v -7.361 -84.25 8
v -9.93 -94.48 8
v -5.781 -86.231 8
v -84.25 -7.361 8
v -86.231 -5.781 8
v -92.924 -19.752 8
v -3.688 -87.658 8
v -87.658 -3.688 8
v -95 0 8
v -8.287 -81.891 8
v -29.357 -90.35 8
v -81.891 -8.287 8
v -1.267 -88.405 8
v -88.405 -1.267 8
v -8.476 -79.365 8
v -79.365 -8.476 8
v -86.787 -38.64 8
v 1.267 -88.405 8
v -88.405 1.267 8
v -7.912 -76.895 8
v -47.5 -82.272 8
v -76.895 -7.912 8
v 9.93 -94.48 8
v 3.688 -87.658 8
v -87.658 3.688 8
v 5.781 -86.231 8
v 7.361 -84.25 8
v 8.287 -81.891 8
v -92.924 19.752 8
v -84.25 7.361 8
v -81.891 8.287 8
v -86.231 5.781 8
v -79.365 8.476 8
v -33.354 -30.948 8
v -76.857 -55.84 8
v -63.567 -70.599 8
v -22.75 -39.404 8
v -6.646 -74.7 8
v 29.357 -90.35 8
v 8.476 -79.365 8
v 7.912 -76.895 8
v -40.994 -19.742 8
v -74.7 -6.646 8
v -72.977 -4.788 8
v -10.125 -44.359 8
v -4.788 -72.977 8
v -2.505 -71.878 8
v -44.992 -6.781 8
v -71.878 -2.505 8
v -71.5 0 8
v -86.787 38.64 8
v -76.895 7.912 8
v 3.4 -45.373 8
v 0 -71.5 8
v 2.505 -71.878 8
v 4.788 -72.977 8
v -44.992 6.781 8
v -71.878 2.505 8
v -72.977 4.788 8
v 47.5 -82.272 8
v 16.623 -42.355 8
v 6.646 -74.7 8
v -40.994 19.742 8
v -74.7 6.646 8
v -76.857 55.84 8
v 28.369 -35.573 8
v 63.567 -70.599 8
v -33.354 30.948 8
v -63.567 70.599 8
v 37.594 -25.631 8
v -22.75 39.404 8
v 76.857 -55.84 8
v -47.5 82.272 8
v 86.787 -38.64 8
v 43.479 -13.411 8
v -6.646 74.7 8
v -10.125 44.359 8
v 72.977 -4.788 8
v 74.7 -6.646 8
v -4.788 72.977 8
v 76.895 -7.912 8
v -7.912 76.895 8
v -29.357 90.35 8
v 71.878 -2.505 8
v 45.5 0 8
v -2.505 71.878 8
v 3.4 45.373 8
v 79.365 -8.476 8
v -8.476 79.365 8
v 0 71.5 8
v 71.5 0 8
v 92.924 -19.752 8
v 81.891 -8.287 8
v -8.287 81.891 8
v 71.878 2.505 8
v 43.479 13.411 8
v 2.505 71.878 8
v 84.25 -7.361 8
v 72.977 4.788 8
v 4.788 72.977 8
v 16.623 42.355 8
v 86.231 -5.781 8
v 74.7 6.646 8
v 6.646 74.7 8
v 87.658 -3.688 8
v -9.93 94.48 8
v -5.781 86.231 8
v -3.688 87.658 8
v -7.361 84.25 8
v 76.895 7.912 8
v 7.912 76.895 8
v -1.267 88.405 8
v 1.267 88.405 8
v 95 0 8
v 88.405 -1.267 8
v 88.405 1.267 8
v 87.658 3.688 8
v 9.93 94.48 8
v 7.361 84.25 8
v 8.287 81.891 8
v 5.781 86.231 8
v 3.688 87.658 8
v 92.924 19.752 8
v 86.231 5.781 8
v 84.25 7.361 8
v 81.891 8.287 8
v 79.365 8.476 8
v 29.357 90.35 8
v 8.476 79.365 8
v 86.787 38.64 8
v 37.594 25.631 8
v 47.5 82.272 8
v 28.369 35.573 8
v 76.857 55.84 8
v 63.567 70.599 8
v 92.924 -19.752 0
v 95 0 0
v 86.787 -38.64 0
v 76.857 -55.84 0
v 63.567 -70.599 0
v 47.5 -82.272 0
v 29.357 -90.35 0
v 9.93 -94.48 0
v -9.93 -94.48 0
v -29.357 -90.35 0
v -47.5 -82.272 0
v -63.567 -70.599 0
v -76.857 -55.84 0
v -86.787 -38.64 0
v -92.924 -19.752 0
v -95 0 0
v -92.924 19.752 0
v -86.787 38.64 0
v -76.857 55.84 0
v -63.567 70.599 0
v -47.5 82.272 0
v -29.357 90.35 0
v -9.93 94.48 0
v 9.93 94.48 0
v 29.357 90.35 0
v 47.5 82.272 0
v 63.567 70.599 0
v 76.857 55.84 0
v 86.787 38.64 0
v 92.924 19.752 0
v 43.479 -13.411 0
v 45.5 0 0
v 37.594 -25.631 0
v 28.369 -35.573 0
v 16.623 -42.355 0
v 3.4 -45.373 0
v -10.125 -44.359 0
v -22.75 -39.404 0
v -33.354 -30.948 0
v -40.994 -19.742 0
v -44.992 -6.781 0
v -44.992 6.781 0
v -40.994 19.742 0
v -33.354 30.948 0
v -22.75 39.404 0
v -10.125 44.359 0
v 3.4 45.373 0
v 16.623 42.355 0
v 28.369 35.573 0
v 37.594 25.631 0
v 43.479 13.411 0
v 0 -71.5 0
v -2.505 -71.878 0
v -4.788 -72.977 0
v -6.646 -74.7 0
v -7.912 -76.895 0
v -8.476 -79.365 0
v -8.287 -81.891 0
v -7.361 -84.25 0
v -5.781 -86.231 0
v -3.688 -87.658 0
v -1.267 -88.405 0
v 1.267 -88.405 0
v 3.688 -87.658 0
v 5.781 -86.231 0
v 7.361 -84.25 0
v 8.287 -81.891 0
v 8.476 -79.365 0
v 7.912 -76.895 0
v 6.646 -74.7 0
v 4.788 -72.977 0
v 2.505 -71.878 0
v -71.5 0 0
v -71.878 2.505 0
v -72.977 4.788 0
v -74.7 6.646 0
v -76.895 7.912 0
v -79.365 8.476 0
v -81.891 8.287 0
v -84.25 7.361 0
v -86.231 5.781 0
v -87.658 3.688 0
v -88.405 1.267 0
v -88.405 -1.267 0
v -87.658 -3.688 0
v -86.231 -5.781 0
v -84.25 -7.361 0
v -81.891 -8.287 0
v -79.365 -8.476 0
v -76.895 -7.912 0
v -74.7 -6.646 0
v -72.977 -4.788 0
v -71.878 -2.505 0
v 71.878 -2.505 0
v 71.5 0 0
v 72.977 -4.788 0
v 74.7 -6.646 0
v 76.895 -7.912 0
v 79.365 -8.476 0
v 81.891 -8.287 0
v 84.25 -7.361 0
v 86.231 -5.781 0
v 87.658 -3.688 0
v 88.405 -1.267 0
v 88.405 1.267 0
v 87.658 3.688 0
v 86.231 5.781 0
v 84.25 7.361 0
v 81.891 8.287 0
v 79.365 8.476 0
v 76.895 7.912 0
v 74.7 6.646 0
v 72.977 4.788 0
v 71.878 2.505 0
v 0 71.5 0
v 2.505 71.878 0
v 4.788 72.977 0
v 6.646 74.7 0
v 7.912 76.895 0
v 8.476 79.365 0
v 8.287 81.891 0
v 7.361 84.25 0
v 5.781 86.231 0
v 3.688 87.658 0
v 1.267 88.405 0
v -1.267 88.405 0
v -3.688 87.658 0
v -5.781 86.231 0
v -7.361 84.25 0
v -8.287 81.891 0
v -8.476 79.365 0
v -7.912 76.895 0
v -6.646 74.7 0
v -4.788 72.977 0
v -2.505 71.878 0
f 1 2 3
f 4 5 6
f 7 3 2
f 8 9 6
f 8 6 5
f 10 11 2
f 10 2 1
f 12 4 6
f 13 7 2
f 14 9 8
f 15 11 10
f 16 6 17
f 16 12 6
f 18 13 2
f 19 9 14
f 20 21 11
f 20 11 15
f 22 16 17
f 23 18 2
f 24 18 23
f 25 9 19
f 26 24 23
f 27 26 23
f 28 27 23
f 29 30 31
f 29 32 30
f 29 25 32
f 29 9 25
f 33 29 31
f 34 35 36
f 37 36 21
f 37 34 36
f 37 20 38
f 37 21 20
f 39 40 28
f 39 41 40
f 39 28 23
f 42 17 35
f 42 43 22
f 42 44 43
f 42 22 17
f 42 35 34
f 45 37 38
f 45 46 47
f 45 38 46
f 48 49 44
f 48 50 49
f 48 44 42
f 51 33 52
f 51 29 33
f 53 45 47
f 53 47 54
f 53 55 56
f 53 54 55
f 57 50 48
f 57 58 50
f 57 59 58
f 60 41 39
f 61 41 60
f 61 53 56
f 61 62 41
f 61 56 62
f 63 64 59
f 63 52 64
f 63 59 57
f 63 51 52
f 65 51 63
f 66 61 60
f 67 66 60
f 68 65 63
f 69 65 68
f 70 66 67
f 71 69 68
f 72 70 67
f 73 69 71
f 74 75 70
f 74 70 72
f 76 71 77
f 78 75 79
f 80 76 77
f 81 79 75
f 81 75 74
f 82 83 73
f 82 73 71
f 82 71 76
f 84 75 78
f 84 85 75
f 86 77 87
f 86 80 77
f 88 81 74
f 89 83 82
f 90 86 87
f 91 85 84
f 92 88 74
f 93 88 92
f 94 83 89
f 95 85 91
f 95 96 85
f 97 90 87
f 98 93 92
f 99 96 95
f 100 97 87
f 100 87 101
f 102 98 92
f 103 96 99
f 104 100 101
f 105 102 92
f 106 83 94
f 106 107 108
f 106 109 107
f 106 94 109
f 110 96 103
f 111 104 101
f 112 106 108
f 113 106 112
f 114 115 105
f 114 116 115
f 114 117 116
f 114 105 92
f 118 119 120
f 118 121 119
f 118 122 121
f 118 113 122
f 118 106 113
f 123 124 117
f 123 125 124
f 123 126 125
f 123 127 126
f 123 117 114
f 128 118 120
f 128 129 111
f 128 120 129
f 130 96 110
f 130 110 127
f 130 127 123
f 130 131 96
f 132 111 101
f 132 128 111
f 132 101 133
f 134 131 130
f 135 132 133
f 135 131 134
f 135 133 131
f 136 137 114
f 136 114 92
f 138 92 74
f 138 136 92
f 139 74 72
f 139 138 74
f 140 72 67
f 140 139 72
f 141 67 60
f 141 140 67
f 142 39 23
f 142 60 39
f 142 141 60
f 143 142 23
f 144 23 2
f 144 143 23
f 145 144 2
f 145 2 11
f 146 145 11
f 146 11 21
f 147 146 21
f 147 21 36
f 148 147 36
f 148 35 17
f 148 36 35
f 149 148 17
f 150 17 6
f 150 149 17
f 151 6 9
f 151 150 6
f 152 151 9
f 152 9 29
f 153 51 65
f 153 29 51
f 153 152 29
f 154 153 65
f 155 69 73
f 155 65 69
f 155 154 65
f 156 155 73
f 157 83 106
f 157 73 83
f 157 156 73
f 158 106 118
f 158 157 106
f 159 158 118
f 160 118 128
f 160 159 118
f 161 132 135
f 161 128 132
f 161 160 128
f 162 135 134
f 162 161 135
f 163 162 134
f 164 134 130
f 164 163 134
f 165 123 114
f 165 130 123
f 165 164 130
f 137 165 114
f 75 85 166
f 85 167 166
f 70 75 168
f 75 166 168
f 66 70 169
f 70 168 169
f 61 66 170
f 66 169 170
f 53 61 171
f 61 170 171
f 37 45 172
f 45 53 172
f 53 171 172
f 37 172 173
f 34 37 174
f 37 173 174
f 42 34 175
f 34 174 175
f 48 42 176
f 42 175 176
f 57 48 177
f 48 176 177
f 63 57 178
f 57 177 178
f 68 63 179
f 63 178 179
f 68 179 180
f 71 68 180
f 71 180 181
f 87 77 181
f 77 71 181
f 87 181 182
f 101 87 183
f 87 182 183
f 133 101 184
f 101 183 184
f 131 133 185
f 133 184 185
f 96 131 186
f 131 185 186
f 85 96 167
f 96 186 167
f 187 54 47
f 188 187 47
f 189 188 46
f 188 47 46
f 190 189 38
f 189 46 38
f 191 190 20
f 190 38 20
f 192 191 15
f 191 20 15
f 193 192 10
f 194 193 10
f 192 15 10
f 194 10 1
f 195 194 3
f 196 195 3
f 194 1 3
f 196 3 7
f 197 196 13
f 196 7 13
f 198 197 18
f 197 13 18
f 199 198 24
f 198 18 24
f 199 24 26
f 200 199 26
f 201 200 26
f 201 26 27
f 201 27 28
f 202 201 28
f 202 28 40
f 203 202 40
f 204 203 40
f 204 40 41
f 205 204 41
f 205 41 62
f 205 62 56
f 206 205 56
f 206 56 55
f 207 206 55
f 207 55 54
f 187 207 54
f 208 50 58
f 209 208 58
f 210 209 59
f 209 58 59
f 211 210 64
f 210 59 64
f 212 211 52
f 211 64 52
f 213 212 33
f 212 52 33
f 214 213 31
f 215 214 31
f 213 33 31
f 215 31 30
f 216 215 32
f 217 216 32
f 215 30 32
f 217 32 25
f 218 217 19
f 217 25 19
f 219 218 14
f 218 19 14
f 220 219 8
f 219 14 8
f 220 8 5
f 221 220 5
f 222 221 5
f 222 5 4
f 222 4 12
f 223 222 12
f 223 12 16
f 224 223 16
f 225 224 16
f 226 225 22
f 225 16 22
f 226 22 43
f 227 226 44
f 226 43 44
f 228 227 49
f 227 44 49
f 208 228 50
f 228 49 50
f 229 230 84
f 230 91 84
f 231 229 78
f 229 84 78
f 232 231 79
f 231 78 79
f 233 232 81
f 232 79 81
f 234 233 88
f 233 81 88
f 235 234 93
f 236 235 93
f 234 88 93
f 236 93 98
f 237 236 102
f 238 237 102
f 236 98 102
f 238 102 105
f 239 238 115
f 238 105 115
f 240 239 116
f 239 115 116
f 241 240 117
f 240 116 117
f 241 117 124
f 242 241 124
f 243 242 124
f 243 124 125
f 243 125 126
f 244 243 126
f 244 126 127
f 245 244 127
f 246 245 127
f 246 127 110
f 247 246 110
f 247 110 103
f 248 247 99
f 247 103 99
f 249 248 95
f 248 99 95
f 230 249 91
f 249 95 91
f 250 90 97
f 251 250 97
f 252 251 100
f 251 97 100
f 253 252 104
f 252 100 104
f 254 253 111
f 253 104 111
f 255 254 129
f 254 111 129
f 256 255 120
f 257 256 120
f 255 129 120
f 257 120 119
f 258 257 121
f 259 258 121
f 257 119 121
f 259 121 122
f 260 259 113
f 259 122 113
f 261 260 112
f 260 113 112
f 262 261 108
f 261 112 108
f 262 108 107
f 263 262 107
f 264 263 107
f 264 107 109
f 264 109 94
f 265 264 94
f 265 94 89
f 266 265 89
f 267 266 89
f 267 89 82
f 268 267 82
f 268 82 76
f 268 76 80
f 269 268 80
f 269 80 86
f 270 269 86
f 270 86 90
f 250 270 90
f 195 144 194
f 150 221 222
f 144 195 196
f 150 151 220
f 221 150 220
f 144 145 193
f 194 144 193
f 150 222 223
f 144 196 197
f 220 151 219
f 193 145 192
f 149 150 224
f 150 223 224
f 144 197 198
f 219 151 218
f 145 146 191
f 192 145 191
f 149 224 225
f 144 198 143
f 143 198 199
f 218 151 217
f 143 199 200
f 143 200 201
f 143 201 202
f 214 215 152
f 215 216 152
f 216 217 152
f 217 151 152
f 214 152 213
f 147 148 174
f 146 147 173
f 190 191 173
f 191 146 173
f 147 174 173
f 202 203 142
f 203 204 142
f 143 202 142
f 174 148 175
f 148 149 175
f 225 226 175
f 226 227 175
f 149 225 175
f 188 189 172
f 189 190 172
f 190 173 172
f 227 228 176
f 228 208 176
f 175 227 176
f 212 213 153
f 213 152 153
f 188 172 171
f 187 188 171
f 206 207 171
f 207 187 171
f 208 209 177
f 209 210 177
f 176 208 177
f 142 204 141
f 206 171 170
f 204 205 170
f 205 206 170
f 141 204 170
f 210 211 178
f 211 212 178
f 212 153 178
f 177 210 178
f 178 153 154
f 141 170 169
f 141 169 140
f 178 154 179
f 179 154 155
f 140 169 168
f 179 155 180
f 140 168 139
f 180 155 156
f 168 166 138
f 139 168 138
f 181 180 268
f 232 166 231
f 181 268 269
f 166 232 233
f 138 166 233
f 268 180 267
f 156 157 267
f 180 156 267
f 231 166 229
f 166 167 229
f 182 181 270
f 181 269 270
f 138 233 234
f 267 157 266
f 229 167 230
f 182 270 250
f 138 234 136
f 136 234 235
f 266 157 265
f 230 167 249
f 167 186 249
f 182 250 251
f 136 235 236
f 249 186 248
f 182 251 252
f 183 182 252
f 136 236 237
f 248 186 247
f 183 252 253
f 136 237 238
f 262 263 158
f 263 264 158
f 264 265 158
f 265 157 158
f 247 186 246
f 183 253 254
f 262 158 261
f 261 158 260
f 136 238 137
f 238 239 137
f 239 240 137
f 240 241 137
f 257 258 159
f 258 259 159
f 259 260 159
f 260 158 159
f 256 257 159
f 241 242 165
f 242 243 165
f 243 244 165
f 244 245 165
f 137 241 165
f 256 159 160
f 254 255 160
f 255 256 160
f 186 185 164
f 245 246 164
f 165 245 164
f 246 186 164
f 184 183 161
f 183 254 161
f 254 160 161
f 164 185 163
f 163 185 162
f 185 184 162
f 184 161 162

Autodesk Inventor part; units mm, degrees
ref_plane "YZ Plane" through (0, 0, 0) normal (1, 0, 0) x (0, 1, 0)
ref_plane "XZ Plane" through (0, 0, 0) normal (0, 1, 0) x (-1, 0, 0)
ref_plane "XY Plane" through (0, 0, 0) normal (0, 0, 1) x (1, 0, 0)
sketch "Sketch2" plane through (0, 0, 0) normal (0, 0, 1) x (1, 0, 0)
  circle A0 centre (0, 0) radius 45.5
  circle A1 centre (0, 0) radius 95
  dimension "d25" = 91
  dimension "d27" = 190
extrude "Plate2" add sketch "Sketch2" along normal blind 8
sketch "Sketch3" plane through (0, 0, 8) normal (0, 0, 1) x (1, 0, 0)
  circle A0 centre (-80, 0) radius 8.5
  circle A1 centre (0, 0) radius 80 construction
  dimension "d28" = 160
  dimension "d15" = 17
extrude "Cut1" cut sketch "Sketch3" against normal blind 8
pattern_circular "Circular Pattern1" count 4 over 360 about axis through (0, 0, -10) along (0, 0, 1) of "Cut1"
equation "\"d17\" = Thickness"
equation "\"d14\" = Thickness"
equation "\"BendReliefWidth\" = Thickness"
equation "\"BendReliefDepth\" = 0.5 * Thickness"
equation "\"CornerReliefSize\" = 4 * Thickness"
equation "\"MinimumRemnant\" = 2 * Thickness"
equation "\"TransitionRadius\" = BendRadius"
equation "\"JacobiRadiusSize\" = BendRadius"
equation "\"GapSize\" = Thickness"
equation "\"Thickness\" = 8"
equation "\"BendRadius\" = 6"
properties part number "PNS 734 FDS flange DN90" material "Steel"
